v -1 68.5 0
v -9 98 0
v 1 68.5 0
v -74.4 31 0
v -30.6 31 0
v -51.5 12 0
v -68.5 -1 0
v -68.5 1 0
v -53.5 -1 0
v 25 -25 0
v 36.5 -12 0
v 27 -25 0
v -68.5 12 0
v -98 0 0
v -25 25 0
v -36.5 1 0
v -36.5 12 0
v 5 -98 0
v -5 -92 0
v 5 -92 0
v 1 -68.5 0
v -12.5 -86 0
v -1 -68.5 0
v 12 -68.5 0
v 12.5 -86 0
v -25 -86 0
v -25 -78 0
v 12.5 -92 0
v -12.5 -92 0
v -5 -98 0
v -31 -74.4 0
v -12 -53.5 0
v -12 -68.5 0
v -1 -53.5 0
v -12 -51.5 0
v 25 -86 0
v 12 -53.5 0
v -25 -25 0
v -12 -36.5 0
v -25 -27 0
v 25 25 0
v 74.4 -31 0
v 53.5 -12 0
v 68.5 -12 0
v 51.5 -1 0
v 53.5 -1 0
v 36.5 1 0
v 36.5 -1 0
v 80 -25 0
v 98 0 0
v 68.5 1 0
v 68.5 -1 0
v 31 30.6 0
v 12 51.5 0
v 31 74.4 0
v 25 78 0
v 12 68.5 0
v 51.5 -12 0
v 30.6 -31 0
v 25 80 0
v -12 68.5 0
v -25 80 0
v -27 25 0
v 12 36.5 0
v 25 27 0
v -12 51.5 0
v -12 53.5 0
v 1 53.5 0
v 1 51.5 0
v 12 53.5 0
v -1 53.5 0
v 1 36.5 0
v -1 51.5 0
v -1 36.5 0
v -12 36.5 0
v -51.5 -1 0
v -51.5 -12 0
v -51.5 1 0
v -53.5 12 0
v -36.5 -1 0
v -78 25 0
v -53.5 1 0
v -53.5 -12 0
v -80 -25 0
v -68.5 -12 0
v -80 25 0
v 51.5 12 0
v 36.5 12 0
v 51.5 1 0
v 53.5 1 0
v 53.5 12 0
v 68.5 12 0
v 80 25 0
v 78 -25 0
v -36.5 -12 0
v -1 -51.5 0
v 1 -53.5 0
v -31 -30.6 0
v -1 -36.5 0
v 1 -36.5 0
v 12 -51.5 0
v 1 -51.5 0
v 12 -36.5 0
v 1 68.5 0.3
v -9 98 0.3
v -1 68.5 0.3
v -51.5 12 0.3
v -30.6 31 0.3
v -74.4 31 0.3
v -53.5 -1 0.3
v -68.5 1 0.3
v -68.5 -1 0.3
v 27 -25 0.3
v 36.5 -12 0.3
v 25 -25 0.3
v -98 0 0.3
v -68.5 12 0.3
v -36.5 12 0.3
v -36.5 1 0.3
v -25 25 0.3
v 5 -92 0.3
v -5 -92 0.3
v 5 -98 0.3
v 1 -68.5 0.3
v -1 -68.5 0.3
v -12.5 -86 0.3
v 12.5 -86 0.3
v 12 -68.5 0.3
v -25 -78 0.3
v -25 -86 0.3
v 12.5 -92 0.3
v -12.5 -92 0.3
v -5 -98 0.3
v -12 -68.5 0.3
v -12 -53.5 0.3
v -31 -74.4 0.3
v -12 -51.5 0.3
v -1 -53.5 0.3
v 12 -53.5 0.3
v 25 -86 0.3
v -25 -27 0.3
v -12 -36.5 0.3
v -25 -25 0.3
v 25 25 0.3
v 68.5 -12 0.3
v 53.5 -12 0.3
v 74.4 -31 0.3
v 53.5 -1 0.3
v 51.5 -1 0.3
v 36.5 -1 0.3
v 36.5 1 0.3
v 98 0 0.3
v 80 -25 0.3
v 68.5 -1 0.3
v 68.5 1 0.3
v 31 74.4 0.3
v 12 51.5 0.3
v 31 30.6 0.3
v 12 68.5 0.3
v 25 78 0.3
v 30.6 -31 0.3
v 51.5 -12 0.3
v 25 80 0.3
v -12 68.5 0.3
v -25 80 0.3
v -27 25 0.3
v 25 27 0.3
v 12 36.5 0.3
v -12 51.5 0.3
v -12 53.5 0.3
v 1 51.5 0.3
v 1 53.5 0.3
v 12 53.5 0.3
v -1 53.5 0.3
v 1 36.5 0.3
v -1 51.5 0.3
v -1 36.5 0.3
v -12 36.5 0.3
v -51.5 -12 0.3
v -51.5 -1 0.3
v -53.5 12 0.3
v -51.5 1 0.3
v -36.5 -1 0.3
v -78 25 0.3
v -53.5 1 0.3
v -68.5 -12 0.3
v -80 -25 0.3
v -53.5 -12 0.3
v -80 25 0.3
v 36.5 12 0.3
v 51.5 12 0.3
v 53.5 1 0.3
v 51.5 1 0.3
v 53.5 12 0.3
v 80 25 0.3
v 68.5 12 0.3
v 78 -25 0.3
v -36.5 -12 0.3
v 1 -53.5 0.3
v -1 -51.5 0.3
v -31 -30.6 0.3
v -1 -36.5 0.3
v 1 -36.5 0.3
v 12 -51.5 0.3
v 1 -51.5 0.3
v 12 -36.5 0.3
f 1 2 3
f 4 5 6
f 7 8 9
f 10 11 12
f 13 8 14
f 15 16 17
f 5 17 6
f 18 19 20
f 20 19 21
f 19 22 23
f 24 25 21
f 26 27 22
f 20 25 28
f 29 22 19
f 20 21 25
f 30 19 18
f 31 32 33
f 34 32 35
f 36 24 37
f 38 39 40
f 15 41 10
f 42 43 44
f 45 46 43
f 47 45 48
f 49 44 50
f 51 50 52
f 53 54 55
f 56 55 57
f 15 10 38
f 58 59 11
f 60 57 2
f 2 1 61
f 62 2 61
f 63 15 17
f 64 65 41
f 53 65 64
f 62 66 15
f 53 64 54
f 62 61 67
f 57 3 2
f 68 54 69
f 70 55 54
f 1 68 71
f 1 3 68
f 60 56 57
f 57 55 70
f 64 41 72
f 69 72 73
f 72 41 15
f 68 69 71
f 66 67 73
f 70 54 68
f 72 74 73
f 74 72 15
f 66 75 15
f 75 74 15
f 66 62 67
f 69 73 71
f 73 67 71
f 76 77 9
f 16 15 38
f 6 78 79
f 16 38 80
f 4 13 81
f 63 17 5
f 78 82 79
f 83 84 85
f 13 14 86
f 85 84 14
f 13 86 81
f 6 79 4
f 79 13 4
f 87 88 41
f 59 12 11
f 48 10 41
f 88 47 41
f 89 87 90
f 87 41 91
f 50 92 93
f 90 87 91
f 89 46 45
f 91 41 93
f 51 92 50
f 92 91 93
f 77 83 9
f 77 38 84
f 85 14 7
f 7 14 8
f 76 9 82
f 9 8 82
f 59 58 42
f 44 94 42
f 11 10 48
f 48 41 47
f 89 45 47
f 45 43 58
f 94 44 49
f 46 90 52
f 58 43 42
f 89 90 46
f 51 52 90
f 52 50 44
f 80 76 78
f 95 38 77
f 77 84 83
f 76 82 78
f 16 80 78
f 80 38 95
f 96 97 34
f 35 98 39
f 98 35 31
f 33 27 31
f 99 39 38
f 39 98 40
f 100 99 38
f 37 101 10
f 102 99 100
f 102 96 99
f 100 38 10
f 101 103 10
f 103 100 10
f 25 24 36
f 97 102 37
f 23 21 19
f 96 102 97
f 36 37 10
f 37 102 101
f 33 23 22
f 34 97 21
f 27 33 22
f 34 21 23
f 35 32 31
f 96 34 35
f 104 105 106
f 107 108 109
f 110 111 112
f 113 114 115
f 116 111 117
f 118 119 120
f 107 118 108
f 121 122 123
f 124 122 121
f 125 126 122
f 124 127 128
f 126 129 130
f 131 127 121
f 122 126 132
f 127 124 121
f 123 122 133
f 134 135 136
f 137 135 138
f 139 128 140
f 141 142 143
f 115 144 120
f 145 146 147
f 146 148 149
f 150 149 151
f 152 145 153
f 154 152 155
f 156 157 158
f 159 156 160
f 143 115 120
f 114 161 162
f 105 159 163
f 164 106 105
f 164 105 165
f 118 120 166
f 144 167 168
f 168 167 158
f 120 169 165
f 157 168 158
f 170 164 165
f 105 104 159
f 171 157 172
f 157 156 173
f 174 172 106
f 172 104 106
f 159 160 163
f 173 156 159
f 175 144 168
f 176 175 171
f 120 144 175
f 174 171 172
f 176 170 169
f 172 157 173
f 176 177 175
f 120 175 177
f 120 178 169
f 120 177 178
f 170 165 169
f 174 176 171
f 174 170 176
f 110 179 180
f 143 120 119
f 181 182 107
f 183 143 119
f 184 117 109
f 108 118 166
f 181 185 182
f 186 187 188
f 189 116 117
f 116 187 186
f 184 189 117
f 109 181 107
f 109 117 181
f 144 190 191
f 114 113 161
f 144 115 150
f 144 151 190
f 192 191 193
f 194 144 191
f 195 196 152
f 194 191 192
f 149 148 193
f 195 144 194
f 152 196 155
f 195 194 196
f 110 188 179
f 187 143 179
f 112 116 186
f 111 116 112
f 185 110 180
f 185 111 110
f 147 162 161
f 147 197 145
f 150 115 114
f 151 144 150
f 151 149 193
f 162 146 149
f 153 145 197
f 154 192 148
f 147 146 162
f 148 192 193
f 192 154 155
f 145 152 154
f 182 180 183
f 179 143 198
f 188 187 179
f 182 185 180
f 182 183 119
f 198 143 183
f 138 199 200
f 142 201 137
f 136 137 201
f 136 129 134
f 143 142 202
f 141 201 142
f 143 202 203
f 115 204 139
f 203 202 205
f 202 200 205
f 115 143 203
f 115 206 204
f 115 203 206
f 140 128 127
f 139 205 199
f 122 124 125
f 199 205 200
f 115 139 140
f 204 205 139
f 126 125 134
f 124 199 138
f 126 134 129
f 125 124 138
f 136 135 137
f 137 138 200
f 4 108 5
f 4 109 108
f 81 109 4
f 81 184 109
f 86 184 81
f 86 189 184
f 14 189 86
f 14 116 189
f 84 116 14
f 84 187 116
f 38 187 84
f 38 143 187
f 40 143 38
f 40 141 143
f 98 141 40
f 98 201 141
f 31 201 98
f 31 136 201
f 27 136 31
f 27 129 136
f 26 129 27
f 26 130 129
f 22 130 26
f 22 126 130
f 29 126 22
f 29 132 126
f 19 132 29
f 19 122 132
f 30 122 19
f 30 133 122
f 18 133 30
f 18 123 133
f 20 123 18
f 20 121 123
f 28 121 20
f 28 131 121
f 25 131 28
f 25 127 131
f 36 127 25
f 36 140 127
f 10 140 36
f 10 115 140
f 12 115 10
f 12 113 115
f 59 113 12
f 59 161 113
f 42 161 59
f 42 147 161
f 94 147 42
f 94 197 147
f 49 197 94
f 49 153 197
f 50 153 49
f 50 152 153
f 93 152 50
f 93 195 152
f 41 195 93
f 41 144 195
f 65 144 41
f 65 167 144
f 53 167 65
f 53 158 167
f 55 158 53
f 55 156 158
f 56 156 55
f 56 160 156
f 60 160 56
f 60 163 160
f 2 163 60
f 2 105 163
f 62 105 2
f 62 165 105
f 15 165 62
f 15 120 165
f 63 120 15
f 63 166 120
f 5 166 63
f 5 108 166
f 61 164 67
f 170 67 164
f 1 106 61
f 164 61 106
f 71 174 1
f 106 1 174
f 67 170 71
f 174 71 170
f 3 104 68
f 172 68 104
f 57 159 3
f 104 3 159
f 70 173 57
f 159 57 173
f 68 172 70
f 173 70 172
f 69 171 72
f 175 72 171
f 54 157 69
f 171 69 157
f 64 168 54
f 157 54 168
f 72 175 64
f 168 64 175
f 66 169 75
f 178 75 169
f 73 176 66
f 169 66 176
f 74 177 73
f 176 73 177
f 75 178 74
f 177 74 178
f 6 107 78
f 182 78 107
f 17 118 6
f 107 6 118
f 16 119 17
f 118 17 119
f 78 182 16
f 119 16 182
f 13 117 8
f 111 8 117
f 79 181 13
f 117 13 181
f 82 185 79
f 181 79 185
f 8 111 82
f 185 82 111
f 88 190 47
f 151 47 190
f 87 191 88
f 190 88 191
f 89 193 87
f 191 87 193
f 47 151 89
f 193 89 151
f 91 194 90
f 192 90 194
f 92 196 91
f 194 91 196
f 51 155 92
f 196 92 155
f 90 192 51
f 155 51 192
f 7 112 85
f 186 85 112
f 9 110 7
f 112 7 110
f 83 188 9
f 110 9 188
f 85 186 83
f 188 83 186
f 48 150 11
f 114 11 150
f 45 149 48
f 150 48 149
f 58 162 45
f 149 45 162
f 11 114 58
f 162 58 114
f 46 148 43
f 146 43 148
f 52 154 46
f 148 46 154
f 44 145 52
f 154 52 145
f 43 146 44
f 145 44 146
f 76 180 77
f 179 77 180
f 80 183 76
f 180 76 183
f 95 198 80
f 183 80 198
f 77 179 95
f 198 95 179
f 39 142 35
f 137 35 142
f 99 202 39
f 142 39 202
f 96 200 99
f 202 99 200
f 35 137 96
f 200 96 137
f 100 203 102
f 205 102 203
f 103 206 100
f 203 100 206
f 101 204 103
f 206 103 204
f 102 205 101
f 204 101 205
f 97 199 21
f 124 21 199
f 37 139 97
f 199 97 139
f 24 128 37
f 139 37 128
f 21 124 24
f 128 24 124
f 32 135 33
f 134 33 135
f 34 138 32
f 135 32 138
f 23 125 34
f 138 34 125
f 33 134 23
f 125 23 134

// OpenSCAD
// Copyright (C) [Jonas Immanuel Frey] - Licensed under GPL

// One-piece paper lantern net. All dimensions are in millimetres.
// Roof shapes are upright silhouettes; the folded lantern is open on top.

/* [Output] */
output = "flat"; // [flat:Flat STL, cut:2D SVG or DXF, assembled:Folded preview]
// Guides appear only in the flat F5 preview, never in exported cutting geometry.
show_fold_guides = true;
paper_thickness = 0.3; // [0.1:0.05:1]

/* [House] */
// Square floor and width of each wall.
house_size = 50; // [30:1:90]
wall_height = 55; // [35:1:100]
roof_height = 18; // [0:1:40]
roof_style = "mixed"; // [mixed, gable, crooked, stepped, flat]

/* [Windows] */
// One centred window per wall. Cross leaves four panes joined by paper bars.
window_style = "cross"; // [cross, plain]
window_width = 24; // [10:1:60]
window_height = 32; // [10:1:70]
window_bar = 2; // [1:0.5:5]

/* [Glue tabs] */
glue_tab_width = 6; // [3:0.5:12]
// Clearance at the floor and eaves so neighbouring folds do not bunch up.
tab_inset = 2; // [1:0.5:5]

/* [Hidden] */
minimum_border = 2;
tab_taper = glue_tab_width * 0.6;
guide_width = 0.25;
mixed_roofs = ["crooked", "gable", "stepped", "gable"];
flat_span = house_size + 2 * (wall_height + (roof_style == "flat" ? 0 : roof_height));

assert(output == "flat" || output == "cut" || output == "assembled",
       "Choose flat, cut or assembled output.");
assert(roof_style == "mixed" || roof_style == "gable" || roof_style == "crooked"
       || roof_style == "stepped" || roof_style == "flat", "Unknown roof style.");
assert(window_style == "cross" || window_style == "plain", "Unknown window style.");
assert(house_size > 0 && wall_height > 0 && roof_height >= 0 && paper_thickness > 0,
       "House size, wall height and thickness must be positive; roof height cannot be negative.");
assert(glue_tab_width > 0 && tab_inset > 0
       && wall_height > 2 * (tab_inset + tab_taper),
       "Tabs need positive width/inset and enough wall height for their tapered ends.");
assert(window_width > 0 && window_height > 0
       && window_width <= house_size - 2 * (glue_tab_width + minimum_border)
       && window_height <= wall_height - 2 * minimum_border,
       "Windows must leave 2 mm borders and space for the folded glue tabs.");
assert(window_style != "cross" || (window_bar >= 1
       && window_bar < min(window_width, window_height) - 2),
       "Window bars must be at least 1 mm wide and leave panes wider than 1 mm.");

echo(str("Floor: ", house_size, " x ", house_size,
         " mm; flat footprint: ", flat_span, " x ", flat_span, " mm."));

function wall_roof(index) = roof_style == "mixed" ? mixed_roofs[index] : roof_style;

// Local wall coordinates: x = width, y = height above the floor fold.
module wall_outline_2d(style) {
    if (style == "flat" || roof_height == 0)
        square([house_size, wall_height]);
    else if (style == "stepped")
        polygon([
            [0, 0], [house_size, 0],
            [house_size, wall_height + roof_height / 3],
            [house_size * 0.75, wall_height + roof_height / 3],
            [house_size * 0.75, wall_height + roof_height * 2 / 3],
            [house_size * 0.6, wall_height + roof_height * 2 / 3],
            [house_size * 0.6, wall_height + roof_height],
            [house_size * 0.4, wall_height + roof_height],
            [house_size * 0.4, wall_height + roof_height * 2 / 3],
            [house_size * 0.25, wall_height + roof_height * 2 / 3],
            [house_size * 0.25, wall_height + roof_height / 3],
            [0, wall_height + roof_height / 3]
        ]);
    else
        polygon([
            [0, 0], [house_size, 0], [house_size, wall_height],
            [house_size * (style == "crooked" ? 0.32 : 0.5), wall_height + roof_height],
            [0, wall_height]
        ]);
}

module window_cutout_2d() {
    translate([house_size / 2, wall_height / 2])
        difference() {
            square([window_width, window_height], center = true);
            if (window_style == "cross") {
                square([window_bar, window_height + 2], center = true);
                square([window_width + 2, window_bar], center = true);
            }
        }
}

module wall_2d(index) {
    difference() {
        wall_outline_2d(wall_roof(index));
        window_cutout_2d();
    }
}

// One tab on each wall's right edge; each corner receives exactly one tab.
module glue_tab_2d() {
    polygon([
        [house_size, tab_inset],
        [house_size + glue_tab_width, tab_inset + tab_taper],
        [house_size + glue_tab_width, wall_height - tab_inset - tab_taper],
        [house_size, wall_height - tab_inset]
    ]);
}

module place_flat_wall(index) {
    rotate([0, 0, index * 90])
        translate([-house_size / 2, house_size / 2, 0]) children();
}

module net_2d() {
    union() {
        square([house_size, house_size], center = true);
        for (index = [0:3])
            place_flat_wall(index) {
                wall_2d(index);
                glue_tab_2d();
            }
    }
}

module fold_guides_2d() {
    for (index = [0:3])
        place_flat_wall(index) {
            translate([0, -guide_width / 2]) square([house_size, guide_width]);
            translate([house_size - guide_width / 2, tab_inset])
                square([guide_width, wall_height - 2 * tab_inset]);
        }
}

// Idealised folds for inspection; no allowance for paper bend radius.
module assembled() {
    color("#56364b")
        linear_extrude(paper_thickness)
            square([house_size, house_size], center = true);
    for (index = [0:3])
        rotate([0, 0, index * 90])
            translate([-house_size / 2, house_size / 2, paper_thickness / 2])
                rotate([90, 0, 0]) {
                    color(index % 2 == 0 ? "#56364b" : "#754d65")
                        linear_extrude(paper_thickness) wall_2d(index);
                    // Swing the right-hand tab inward against the next wall.
                    color("#b890a8")
                        translate([house_size - paper_thickness, 0, 0])
                            rotate([0, -90, 0])
                                linear_extrude(paper_thickness)
                                    translate([-house_size, 0]) glue_tab_2d();
                }
}

if (output == "cut") net_2d();
else if (output == "assembled") assembled();
else {
    color("#56364b") linear_extrude(paper_thickness) net_2d();
    if ($preview && show_fold_guides)
        color("#ff9c38")
            translate([0, 0, paper_thickness + 0.01])
                linear_extrude(0.01) fold_guides_2d();
}
